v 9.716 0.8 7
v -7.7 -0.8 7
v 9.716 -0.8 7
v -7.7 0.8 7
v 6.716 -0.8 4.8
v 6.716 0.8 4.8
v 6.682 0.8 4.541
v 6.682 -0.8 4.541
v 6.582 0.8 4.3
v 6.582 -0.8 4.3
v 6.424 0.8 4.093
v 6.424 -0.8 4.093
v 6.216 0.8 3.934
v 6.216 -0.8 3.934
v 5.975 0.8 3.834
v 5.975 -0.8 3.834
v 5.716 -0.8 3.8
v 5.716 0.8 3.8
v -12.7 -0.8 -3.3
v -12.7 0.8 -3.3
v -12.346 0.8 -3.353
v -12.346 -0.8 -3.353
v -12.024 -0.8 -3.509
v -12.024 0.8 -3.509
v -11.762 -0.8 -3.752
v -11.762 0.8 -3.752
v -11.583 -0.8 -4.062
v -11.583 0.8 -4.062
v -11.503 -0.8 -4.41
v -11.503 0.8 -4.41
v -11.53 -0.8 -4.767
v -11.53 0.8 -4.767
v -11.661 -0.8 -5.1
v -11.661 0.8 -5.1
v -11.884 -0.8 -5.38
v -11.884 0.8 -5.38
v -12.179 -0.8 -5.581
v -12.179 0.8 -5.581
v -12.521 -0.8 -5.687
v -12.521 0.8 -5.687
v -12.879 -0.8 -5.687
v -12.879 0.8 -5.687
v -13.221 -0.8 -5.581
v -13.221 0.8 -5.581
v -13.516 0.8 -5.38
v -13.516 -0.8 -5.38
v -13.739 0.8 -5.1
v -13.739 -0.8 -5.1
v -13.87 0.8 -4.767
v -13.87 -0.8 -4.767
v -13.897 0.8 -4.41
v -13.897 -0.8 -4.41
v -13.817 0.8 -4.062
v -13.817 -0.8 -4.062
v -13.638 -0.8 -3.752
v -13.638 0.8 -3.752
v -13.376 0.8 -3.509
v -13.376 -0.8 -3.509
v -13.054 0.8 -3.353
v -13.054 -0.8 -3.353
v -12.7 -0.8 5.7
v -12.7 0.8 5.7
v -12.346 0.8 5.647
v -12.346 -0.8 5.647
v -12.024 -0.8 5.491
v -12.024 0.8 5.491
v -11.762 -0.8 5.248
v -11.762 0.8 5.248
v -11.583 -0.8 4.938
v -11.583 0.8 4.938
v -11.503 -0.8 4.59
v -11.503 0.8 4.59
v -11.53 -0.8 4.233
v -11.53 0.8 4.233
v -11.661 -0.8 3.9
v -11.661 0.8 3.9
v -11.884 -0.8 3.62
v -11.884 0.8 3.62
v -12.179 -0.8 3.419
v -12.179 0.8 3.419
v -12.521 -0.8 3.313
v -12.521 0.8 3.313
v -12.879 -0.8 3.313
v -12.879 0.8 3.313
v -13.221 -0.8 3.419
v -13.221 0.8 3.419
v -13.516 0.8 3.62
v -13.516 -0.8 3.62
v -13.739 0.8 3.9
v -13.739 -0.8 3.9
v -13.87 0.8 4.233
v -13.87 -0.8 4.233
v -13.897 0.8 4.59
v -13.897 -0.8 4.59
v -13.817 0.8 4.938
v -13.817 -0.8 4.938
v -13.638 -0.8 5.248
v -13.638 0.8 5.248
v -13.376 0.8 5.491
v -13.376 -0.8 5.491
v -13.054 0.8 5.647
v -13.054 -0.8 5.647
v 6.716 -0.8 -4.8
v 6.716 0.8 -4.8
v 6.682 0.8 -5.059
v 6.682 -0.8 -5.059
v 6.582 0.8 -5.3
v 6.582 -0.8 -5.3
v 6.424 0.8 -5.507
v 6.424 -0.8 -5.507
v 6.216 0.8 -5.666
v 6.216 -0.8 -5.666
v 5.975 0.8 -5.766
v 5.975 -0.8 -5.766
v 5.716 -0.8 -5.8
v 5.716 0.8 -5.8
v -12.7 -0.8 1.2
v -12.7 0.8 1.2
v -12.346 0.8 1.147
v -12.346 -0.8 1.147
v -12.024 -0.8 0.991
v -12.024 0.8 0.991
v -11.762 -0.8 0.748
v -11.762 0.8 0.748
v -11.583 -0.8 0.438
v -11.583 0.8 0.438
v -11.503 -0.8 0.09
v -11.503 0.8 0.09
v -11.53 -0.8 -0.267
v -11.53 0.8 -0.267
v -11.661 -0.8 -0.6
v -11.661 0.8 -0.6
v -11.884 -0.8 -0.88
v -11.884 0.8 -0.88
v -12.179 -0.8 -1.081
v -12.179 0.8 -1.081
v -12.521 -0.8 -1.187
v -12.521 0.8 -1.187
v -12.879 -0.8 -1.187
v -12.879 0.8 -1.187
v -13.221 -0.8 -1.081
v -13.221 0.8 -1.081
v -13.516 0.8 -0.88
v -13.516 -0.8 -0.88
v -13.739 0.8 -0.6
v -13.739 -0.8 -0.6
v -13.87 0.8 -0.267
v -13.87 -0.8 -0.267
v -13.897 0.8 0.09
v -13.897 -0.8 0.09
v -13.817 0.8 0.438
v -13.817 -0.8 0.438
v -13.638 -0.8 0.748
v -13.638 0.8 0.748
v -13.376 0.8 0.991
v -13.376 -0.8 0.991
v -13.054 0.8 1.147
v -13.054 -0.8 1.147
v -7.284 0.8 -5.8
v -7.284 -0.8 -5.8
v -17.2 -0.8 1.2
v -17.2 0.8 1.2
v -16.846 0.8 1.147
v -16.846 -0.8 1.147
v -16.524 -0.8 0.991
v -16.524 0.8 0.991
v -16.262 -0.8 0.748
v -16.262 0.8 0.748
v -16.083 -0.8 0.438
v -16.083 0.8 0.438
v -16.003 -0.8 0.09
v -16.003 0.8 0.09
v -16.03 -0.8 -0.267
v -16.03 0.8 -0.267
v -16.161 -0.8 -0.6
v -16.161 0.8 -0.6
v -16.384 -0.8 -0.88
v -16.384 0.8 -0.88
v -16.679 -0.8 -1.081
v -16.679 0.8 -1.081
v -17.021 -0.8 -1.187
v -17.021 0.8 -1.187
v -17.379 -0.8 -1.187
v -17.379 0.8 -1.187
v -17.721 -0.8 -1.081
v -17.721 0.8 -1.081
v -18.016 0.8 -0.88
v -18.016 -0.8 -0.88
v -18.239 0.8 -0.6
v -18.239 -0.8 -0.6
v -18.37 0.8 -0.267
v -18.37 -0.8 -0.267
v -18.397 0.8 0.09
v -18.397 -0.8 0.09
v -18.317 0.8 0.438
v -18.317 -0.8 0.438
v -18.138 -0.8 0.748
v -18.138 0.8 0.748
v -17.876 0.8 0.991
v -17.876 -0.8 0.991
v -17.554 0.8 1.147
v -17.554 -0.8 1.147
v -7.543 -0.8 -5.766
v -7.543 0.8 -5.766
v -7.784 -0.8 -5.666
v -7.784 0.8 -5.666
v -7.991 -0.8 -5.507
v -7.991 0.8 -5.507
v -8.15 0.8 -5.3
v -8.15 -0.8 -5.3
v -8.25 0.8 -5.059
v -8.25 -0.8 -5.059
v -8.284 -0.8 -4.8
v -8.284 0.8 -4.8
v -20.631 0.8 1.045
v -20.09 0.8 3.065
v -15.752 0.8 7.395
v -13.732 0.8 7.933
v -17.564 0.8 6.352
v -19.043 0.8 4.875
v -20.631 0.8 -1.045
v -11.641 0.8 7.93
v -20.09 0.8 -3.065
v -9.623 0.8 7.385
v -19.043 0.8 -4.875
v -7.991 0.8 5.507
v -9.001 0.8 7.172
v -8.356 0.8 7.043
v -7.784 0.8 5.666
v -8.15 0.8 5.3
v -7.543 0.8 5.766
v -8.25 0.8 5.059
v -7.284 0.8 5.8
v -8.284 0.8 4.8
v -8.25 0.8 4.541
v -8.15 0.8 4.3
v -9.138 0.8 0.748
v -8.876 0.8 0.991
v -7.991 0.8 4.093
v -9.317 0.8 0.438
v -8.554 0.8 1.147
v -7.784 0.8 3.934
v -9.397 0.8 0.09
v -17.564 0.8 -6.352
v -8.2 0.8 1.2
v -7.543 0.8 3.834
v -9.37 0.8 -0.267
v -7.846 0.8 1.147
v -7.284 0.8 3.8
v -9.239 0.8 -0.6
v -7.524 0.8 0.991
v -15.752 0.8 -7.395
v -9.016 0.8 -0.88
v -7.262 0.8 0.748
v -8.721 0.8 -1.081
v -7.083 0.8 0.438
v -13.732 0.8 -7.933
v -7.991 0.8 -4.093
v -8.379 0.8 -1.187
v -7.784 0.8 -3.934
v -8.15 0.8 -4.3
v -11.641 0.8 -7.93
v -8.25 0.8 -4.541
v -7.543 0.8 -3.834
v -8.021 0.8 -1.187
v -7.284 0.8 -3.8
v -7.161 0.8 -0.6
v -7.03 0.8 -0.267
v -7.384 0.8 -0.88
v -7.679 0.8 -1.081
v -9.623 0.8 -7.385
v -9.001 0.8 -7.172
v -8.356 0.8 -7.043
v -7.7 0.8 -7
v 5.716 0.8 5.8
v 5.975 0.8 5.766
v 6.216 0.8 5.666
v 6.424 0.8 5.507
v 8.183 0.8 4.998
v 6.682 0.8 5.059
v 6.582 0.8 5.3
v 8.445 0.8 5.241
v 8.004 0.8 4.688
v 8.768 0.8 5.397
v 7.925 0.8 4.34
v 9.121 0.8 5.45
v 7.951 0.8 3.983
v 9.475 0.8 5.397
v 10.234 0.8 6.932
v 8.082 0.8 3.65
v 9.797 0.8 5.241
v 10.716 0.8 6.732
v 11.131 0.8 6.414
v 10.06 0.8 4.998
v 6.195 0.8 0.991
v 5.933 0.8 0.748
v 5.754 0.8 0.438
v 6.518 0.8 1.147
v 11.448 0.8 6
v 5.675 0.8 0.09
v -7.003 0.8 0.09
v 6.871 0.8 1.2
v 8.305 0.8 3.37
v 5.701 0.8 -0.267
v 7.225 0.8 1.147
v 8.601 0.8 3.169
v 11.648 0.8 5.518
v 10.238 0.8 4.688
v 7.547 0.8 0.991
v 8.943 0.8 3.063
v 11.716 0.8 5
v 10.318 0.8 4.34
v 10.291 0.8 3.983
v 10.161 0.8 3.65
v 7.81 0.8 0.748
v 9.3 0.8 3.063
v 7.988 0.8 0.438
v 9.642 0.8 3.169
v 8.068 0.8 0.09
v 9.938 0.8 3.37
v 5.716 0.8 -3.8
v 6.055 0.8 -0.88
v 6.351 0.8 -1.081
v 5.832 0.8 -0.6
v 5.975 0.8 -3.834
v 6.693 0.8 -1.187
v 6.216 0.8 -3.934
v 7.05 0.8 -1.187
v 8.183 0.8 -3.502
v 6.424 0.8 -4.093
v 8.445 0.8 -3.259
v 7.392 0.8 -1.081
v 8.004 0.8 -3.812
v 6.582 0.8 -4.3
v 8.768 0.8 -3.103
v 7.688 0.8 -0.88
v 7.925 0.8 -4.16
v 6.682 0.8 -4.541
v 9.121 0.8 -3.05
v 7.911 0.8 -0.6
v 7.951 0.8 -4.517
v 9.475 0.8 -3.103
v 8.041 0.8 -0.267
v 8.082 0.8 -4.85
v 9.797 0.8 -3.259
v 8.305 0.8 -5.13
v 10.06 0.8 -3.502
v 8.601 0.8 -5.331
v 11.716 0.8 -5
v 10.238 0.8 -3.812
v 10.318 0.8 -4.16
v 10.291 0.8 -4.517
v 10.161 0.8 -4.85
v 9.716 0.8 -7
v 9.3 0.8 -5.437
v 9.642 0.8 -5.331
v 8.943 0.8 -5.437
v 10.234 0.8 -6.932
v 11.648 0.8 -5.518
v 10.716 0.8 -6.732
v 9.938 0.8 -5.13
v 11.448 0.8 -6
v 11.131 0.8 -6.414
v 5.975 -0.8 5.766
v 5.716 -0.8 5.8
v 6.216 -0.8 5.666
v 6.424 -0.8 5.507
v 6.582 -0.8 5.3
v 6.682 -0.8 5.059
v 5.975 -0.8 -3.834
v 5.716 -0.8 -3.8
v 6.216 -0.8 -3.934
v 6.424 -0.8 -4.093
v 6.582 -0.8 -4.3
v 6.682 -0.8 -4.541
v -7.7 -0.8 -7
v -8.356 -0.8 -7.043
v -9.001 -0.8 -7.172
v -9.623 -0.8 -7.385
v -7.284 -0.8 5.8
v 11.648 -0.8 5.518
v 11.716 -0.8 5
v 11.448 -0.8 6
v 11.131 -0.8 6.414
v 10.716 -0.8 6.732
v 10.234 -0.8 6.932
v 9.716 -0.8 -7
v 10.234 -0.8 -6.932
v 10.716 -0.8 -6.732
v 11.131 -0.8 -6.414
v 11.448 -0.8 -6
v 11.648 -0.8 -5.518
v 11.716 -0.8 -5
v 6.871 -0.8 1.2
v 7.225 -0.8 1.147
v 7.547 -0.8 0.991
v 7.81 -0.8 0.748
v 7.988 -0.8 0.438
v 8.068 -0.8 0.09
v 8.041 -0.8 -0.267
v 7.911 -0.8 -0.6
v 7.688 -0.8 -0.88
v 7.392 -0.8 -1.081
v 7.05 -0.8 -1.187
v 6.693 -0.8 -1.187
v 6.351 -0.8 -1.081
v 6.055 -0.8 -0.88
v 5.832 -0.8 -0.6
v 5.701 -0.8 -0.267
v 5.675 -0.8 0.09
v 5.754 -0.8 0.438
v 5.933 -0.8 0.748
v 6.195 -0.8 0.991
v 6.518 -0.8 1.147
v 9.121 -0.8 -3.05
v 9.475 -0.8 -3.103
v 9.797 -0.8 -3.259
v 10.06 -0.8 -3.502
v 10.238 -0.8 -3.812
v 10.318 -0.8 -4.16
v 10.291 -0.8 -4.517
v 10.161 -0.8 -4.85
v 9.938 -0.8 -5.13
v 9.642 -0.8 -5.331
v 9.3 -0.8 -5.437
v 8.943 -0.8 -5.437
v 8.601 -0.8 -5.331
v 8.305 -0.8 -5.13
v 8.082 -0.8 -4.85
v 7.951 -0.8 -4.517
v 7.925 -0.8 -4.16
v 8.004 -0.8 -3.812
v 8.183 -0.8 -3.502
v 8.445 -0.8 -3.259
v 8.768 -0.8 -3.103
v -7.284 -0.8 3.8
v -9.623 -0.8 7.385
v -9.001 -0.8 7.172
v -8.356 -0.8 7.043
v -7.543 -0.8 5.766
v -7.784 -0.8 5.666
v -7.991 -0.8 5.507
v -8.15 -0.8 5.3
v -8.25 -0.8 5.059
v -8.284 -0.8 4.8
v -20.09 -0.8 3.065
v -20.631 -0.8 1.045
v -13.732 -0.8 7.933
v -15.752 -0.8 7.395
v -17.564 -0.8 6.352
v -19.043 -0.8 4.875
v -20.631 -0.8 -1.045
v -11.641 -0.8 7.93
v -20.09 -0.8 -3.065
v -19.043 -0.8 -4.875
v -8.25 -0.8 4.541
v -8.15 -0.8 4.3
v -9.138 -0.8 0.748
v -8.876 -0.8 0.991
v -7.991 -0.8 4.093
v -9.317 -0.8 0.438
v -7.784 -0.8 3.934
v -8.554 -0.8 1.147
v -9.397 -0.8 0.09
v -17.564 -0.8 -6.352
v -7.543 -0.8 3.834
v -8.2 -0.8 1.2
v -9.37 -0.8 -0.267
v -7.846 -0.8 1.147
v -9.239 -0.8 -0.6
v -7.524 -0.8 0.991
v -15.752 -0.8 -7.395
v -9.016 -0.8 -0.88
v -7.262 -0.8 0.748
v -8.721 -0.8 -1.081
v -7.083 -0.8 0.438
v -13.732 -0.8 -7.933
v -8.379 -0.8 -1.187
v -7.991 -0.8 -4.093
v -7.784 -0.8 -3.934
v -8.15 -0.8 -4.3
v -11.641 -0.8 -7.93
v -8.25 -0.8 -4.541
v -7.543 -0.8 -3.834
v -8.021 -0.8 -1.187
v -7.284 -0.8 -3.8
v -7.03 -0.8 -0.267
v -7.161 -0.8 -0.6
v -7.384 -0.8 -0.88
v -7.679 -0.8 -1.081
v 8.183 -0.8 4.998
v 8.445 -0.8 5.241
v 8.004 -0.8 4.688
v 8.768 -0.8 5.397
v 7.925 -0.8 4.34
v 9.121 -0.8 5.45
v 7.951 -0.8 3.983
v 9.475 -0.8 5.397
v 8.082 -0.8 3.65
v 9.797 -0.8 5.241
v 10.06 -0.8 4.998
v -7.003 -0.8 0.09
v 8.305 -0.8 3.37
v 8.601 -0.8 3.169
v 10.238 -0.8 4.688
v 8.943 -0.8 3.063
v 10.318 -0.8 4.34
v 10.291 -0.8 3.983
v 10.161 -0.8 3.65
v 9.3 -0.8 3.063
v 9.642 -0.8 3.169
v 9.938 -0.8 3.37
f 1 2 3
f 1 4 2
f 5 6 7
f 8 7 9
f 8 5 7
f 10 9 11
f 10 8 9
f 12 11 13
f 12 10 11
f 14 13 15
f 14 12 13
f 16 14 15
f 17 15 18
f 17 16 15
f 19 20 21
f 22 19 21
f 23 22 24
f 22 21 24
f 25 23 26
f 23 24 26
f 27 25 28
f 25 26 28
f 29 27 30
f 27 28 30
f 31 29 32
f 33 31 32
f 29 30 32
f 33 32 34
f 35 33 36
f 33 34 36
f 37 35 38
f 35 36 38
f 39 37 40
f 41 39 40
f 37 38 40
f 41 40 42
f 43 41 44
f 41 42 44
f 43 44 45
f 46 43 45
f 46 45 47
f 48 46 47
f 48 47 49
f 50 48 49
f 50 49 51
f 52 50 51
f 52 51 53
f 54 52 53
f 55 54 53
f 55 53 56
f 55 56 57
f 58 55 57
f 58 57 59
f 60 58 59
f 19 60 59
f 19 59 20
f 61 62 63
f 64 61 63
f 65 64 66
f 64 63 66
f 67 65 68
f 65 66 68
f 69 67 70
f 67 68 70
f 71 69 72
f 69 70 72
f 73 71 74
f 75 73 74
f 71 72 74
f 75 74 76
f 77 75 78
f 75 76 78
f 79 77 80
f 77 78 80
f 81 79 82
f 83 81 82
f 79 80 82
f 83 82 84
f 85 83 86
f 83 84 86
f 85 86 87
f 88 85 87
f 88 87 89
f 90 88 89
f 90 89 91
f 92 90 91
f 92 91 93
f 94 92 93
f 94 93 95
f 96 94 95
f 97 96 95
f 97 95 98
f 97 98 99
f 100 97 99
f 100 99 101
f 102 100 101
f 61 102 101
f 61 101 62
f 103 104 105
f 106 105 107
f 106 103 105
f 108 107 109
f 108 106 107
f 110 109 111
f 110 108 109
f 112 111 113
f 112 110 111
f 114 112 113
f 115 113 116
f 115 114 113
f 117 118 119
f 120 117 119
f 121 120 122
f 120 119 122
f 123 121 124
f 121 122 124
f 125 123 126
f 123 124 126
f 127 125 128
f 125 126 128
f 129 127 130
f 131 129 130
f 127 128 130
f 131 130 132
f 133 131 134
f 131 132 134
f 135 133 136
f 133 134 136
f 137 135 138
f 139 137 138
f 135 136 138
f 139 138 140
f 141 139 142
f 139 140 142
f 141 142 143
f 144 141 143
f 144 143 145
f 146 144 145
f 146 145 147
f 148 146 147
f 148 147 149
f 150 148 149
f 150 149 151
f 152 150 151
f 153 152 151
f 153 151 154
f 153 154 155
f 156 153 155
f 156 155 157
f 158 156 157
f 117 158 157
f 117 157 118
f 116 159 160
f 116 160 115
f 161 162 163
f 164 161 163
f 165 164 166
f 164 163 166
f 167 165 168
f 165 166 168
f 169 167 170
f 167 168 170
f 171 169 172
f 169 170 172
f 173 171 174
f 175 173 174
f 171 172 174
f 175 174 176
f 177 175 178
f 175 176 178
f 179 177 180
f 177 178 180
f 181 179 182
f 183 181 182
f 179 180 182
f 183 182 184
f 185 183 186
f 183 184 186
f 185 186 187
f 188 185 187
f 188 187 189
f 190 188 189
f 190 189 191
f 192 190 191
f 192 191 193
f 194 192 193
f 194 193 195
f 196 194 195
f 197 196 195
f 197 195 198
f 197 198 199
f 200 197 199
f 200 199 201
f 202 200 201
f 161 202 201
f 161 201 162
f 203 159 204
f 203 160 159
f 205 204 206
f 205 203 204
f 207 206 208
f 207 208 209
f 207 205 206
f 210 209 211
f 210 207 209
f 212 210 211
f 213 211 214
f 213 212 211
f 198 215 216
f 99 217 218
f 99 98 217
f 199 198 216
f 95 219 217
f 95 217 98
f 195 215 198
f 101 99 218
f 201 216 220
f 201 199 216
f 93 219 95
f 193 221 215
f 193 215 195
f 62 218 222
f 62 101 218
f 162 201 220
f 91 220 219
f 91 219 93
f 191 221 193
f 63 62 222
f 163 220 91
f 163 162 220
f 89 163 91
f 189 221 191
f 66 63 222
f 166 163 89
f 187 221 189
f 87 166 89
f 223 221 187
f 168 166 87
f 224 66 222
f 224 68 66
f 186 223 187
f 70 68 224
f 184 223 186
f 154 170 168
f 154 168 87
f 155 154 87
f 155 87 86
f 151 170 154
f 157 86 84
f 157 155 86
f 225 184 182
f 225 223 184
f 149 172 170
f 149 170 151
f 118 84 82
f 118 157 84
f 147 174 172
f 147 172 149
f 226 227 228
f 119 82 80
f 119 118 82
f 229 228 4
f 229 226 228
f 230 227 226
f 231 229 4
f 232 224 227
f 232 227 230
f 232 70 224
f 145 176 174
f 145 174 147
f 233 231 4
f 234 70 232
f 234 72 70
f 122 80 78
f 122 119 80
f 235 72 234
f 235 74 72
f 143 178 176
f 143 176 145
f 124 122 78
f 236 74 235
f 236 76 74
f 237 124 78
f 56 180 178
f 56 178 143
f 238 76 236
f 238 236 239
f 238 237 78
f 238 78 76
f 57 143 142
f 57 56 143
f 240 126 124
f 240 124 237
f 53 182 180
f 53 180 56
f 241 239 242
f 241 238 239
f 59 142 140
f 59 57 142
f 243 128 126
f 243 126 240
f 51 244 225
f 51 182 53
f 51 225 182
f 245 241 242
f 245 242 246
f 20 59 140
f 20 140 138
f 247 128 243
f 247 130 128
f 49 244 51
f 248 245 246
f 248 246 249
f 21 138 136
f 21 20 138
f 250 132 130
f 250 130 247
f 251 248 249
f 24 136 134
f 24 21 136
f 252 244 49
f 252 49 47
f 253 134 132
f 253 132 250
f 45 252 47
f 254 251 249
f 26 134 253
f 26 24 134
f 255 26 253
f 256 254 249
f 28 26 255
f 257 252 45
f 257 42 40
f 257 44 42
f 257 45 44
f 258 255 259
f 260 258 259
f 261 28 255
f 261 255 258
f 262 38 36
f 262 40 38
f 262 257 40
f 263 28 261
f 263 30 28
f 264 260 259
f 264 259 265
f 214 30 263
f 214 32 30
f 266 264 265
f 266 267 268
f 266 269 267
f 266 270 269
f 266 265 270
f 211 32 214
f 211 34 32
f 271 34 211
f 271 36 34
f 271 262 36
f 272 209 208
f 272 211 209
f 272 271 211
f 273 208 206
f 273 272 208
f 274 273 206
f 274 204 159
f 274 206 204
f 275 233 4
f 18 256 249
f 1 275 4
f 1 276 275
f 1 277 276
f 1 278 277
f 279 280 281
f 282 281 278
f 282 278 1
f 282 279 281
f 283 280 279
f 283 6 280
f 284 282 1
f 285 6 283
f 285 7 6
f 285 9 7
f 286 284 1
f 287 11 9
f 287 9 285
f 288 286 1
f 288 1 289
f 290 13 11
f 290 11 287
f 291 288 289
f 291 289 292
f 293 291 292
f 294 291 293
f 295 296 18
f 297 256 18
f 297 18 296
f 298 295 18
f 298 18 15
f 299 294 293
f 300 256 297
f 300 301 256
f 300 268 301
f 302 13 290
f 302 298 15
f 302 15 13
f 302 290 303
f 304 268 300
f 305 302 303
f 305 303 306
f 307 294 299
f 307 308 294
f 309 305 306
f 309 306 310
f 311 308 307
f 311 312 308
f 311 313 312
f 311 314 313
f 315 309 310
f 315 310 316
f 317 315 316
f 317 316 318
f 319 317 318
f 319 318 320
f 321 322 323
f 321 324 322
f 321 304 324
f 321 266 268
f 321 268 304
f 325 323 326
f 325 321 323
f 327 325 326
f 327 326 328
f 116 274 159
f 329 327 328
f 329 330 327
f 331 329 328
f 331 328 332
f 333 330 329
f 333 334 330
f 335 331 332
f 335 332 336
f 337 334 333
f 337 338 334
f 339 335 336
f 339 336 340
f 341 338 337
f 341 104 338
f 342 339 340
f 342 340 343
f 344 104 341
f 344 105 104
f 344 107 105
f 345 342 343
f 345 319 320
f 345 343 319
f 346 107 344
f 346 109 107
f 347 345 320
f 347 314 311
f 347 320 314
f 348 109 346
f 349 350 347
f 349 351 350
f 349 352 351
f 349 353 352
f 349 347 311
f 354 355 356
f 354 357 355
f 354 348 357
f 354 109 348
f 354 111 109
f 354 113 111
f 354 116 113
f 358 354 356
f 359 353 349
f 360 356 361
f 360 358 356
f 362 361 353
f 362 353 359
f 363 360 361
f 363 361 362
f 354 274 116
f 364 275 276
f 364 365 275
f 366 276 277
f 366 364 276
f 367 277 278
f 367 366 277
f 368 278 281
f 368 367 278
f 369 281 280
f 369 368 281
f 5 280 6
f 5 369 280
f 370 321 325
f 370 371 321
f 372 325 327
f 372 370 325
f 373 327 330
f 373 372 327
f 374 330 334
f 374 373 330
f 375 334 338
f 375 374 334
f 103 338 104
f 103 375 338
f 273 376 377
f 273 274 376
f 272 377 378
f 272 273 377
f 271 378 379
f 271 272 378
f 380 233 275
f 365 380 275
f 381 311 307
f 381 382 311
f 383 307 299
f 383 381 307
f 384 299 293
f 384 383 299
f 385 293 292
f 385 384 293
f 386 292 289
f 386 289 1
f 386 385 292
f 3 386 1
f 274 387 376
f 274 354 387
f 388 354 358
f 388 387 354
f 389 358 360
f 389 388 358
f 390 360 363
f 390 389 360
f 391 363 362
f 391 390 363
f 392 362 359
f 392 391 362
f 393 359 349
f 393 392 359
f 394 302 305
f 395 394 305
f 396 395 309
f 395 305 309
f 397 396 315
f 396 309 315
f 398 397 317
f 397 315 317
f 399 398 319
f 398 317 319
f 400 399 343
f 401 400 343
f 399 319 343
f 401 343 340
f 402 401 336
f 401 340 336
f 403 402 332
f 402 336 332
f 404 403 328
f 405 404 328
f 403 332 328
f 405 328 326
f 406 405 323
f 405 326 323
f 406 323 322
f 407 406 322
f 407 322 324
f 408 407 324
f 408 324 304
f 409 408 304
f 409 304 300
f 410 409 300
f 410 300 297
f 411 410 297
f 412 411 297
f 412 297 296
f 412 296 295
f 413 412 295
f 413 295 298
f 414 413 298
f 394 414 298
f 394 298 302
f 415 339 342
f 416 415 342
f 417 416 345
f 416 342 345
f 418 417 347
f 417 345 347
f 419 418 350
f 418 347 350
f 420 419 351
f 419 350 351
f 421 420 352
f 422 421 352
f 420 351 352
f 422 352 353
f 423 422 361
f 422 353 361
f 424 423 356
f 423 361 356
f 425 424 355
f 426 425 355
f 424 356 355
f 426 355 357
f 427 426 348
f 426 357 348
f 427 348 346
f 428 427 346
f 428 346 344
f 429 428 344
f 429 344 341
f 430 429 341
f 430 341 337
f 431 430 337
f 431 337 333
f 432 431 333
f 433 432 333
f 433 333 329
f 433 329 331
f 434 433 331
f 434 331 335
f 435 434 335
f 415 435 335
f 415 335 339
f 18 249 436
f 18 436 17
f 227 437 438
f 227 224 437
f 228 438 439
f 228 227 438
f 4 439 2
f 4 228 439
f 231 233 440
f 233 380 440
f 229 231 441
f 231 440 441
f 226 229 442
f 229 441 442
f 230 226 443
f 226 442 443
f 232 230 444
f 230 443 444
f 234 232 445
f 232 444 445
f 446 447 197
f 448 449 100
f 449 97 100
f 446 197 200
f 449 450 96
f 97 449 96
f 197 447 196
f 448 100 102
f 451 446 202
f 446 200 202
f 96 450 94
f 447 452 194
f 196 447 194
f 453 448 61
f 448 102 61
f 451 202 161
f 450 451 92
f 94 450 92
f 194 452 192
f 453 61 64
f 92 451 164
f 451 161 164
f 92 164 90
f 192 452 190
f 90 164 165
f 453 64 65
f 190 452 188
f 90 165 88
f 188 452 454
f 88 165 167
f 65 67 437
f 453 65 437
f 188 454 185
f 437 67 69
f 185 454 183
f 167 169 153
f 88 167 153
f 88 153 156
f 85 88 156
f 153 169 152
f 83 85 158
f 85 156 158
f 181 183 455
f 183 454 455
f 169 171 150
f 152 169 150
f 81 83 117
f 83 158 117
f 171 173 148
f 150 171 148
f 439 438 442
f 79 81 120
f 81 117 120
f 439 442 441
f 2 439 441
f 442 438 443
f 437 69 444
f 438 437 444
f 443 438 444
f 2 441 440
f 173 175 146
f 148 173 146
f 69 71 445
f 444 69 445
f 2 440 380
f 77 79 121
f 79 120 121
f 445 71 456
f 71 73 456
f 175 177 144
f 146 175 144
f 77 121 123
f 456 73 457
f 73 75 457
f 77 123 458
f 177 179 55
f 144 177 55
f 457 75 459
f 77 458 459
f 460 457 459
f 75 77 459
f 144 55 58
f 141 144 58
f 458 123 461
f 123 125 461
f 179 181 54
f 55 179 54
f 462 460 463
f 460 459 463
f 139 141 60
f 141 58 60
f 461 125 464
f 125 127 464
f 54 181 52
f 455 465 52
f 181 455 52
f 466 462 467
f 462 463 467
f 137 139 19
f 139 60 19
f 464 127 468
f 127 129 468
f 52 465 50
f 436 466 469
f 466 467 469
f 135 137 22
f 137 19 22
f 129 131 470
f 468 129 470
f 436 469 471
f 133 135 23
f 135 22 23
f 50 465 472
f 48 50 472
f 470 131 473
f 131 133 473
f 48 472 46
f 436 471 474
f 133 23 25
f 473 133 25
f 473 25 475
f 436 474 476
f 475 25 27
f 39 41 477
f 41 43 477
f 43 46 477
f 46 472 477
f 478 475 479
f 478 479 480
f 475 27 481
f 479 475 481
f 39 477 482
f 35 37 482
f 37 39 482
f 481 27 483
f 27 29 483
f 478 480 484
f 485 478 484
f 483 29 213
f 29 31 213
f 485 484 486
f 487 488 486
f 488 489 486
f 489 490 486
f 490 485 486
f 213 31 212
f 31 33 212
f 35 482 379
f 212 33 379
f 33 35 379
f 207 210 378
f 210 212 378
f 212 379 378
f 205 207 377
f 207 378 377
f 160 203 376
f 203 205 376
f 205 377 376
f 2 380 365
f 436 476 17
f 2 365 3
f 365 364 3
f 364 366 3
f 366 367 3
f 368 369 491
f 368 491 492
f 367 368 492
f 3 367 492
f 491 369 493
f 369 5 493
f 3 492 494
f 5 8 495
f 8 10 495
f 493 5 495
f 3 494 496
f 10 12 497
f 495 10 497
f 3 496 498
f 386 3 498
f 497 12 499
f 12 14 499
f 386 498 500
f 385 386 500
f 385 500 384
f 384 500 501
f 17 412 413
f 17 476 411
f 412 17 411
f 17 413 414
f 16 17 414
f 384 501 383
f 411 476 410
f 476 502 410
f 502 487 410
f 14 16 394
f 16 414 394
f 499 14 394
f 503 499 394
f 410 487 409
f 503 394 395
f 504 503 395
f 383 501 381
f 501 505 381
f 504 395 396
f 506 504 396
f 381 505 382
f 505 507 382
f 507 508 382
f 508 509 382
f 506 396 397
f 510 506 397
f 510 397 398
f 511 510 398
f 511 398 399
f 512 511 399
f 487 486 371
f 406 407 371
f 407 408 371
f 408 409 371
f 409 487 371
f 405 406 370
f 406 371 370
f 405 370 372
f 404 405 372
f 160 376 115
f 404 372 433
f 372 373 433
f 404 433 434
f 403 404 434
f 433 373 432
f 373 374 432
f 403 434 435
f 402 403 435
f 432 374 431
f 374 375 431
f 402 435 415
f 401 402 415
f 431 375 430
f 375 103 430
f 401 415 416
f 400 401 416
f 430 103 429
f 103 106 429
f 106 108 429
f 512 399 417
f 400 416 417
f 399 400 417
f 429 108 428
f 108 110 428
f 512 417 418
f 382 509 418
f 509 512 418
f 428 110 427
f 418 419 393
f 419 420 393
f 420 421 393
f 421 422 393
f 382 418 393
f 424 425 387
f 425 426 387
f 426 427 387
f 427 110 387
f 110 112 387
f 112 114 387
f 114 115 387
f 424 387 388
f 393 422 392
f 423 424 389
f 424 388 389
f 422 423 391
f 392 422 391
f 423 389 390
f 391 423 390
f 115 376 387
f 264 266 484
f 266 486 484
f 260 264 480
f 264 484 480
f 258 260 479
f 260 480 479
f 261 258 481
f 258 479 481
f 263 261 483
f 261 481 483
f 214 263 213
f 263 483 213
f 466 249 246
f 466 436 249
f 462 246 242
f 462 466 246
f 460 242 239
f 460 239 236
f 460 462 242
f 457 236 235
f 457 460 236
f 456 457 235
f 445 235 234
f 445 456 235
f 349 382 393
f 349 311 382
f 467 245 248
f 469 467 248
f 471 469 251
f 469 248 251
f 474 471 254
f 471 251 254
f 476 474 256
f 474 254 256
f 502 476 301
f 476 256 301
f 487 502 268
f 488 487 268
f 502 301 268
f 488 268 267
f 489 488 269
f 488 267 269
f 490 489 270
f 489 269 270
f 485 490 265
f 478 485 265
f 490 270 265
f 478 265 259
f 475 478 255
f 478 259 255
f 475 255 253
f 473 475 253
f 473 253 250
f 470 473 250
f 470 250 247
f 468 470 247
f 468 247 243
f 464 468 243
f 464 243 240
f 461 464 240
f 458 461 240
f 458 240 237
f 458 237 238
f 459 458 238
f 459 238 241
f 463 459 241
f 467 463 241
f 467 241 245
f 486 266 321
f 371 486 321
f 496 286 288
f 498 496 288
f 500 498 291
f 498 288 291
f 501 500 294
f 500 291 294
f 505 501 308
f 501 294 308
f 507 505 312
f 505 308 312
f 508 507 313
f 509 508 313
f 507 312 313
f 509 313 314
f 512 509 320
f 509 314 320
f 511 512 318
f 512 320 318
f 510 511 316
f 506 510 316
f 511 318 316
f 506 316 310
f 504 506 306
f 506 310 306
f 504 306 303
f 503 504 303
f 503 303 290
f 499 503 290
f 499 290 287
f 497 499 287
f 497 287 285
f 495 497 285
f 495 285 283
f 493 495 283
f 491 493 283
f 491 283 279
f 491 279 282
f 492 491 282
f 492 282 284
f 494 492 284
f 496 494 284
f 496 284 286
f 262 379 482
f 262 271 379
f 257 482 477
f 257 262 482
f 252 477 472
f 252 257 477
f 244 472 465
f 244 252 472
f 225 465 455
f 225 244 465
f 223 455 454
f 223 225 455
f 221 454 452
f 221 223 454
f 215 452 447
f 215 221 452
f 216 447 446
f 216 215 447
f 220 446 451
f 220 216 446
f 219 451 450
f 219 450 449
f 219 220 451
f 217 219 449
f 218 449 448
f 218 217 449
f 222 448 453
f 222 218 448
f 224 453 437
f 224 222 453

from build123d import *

# Parameters (mm, degrees)
BOSS_EXTRUDE1_DEPTH = 0.8
FILLET1_R           = 2
FILLET2_R           = 5
SKETCH2_R           = 1.2
CUT_EXTRUDE1_DEPTH  = 23.249719099
SKETCH3_R           = 1.2
CUT_EXTRUDE2_DEPTH  = 23.249719099
SKETCH5_W           = 15
SKETCH5_H           = 2
CUT_EXTRUDE3_DEPTH  = 23.249719099
FILLET3_R           = 1


with BuildPart() as part:
    # Sketch1 → Boss-Extrude1 (new, symmetric)
    with BuildSketch(Plane(origin=(0, 0, 0), x_dir=(1, 0, 0), z_dir=(0, 1, 0))):
        with BuildLine():
            Line((11.716387939, 7), (-8.827016654, 7))
            ThreePointArc((-8.827016654, 7), (-20.7, 0), (-8.827016654, -7))
            Line((-8.827016654, -7), (11.716387939, -7))
            Line((11.716387939, -7), (11.716387939, 7))
        make_face()
    extrude(amount=BOSS_EXTRUDE1_DEPTH, both=True)

    # Fillet1
    fillet1_edges = [part.edges().sort_by_distance(p)[0] for p in [
        (11.716387939, 0, 7),
        (11.716387939, 0, -7),
    ]]
    fillet(fillet1_edges, radius=FILLET1_R)

    # Fillet2
    fillet2_edges = [part.edges().sort_by_distance(p)[0] for p in [
        (-8.827016654, 0, 7),
        (-8.827016654, 0, -7),
    ]]
    fillet(fillet2_edges, radius=FILLET2_R)

    # Sketch2 → Cut-Extrude1 (cut, through all)
    with BuildSketch(Plane(origin=(0, 0.8, 0), x_dir=(1, 0, 0), z_dir=(0, 1, 0))):
        with Locations(Location((-8.2, 0, 0), (0, 0, 270))):
            Circle(SKETCH2_R)
        with Locations(Location((-12.7, 4.5, 0), (0, 0, 270))):
            Circle(SKETCH2_R)
        with Locations(Location((-17.2, 0, 0), (0, 0, 270))):
            Circle(SKETCH2_R)
        with Locations(Location((-12.7, -4.5, 0), (0, 0, 270))):
            Circle(SKETCH2_R)
        with Locations(Location((-12.7, 0, 0), (0, 0, 270))):
            Circle(SKETCH2_R)
    extrude(amount=-CUT_EXTRUDE1_DEPTH, mode=Mode.SUBTRACT)

    # Sketch3 → Cut-Extrude2 (cut, through all)
    with BuildSketch(Plane(origin=(0, 0.8, 0), x_dir=(1, 0, 0), z_dir=(0, 1, 0))):
        with Locations(Location((9.121387939, 4.25, 0), (0, 0, 270))):
            Circle(SKETCH3_R)
        with Locations(Location((9.121387939, -4.25, 0), (0, 0, 270))):
            Circle(SKETCH3_R)
        with Locations(Location((6.871387939, 0, 0), (0, 0, 270))):
            Circle(SKETCH3_R)
    extrude(amount=-CUT_EXTRUDE2_DEPTH, mode=Mode.SUBTRACT)

    # Sketch5 → Cut-Extrude3 (cut, through all)
    with BuildSketch(Plane(origin=(0, 0.8, 0), x_dir=(1, 0, 0), z_dir=(0, 1, 0))):
        with Locations((-0.783612061, 4.8)):
            Rectangle(SKETCH5_W, SKETCH5_H)
        with Locations((-0.783612061, -4.8)):
            Rectangle(SKETCH5_W, SKETCH5_H)
    extrude(amount=-CUT_EXTRUDE3_DEPTH, mode=Mode.SUBTRACT)

    # Fillet3
    fillet3_edges = [part.edges().sort_by_distance(p)[0] for p in [
        (-8.283612061, 0, 5.8),
        (6.716387939, 0, 5.8),
        (6.716387939, 0, 3.8),
        (-8.283612061, 0, 3.8),
        (-8.283612061, 0, -3.8),
        (6.716387939, 0, -3.8),
        (6.716387939, 0, -5.8),
        (-8.283612061, 0, -5.8),
    ]]
    fillet(fillet3_edges, radius=FILLET3_R - 0.0001)  # a hair under: the kernel refuses the full size


solid = part.part
